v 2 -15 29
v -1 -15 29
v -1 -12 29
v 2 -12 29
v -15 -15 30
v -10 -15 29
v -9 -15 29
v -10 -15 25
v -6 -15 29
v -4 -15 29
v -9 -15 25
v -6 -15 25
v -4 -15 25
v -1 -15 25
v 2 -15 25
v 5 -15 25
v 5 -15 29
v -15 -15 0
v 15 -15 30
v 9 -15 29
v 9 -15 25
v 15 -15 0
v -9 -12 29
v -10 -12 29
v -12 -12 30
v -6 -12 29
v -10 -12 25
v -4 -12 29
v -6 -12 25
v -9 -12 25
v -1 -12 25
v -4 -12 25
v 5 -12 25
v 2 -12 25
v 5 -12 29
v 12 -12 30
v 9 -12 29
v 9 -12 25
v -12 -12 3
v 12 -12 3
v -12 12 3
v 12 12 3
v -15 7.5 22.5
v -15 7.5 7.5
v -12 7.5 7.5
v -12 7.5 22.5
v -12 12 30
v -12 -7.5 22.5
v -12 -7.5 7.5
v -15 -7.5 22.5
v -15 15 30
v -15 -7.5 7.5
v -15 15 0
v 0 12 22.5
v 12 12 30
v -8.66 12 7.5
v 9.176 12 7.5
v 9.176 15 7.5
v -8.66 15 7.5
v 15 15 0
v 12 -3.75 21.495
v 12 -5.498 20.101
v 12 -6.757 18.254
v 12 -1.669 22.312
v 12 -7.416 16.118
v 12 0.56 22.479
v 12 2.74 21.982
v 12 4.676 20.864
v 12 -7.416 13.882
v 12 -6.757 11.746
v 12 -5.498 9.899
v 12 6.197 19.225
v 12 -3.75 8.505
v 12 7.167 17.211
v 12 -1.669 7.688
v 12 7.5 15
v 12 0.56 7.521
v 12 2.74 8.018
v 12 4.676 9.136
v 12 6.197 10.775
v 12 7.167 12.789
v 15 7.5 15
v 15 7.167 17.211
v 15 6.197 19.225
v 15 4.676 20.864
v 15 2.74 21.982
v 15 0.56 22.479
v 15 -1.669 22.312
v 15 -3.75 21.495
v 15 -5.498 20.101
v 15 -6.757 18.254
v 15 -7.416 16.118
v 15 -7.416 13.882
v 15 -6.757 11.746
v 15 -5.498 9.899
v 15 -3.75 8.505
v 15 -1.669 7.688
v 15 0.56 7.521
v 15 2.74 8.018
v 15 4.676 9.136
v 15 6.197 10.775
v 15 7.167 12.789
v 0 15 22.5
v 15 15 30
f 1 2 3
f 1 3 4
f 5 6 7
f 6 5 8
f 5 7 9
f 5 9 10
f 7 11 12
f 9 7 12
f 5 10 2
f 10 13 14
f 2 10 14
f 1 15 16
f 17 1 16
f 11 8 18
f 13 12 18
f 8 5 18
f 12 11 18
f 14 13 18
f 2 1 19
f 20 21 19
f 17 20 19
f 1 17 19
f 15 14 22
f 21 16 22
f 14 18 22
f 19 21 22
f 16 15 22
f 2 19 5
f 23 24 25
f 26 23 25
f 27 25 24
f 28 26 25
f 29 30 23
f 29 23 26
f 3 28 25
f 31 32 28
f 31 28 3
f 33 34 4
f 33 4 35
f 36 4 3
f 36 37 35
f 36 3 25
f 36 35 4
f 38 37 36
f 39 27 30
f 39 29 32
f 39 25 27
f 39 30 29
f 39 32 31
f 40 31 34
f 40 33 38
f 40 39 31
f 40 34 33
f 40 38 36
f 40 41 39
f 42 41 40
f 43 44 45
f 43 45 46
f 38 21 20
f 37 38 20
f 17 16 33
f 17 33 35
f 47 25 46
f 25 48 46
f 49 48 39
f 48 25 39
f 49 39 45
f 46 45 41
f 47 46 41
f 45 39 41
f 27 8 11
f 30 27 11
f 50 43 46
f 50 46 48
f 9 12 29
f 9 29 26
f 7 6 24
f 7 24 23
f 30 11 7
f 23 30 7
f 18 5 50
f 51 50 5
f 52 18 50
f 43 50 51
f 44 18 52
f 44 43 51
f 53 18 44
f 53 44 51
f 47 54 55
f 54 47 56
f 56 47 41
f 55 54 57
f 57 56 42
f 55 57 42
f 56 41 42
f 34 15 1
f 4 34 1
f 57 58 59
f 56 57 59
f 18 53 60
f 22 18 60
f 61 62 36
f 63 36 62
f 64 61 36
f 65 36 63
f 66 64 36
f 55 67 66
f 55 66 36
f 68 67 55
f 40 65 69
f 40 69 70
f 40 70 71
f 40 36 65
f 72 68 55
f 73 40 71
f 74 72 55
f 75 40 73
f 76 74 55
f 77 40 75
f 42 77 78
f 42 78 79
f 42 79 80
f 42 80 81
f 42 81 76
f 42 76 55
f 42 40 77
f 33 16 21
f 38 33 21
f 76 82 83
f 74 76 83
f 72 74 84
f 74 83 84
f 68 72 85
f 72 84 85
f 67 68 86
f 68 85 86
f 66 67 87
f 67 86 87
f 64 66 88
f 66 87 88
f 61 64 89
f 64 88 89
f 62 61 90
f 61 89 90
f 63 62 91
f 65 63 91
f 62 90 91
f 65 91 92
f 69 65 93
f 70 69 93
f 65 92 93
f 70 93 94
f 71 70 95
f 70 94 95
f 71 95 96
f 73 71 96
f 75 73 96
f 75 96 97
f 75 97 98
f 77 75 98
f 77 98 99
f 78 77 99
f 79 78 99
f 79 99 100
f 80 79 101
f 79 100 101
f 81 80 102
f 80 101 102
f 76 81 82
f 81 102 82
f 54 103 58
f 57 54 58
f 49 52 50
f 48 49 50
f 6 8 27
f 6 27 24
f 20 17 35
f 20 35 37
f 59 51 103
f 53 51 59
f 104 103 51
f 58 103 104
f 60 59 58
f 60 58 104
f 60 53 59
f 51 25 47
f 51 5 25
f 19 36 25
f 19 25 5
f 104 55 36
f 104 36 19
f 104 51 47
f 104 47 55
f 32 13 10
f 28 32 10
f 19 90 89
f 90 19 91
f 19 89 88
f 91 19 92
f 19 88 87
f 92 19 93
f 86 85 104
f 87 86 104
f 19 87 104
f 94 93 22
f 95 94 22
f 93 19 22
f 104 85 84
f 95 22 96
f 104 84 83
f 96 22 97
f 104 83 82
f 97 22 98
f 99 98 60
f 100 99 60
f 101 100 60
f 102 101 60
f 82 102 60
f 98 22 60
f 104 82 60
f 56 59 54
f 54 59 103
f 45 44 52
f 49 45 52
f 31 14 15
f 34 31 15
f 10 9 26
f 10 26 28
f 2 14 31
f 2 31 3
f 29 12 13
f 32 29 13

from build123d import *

# Parameters (mm, degrees)
F0_W      = 30
F0_H      = 30
F1_DEPTH  = 30
F2_T      = -3
F3_W      = 15
F3_H      = 15
F4_DEPTH  = 3
F5_R      = 7.5
F6_DEPTH  = 3
F8_DEPTH  = 3
F9_W      = 1
F9_H      = 4
F9_W_2    = 2
F9_W_3    = 3
F9_W_4    = 4
F10_DEPTH = 4


with BuildPart() as f1:
    # F0 (on Top) → F1 (new body)
    with BuildSketch(Plane.XY):
        Rectangle(F0_W, F0_H)
    extrude(amount=F1_DEPTH)

    # F2
    f2_openings = [f1.faces().sort_by_distance(p)[0] for p in [
        (0, 0, 30),
    ]]
    offset(amount=F2_T, openings=f2_openings)

    # F3 (on face) → F4 (cut, through all)
    with BuildSketch(Plane(origin=(-15, 0, 0), x_dir=(0, -1, 0), z_dir=(-1, 0, 0))):
        with Locations((0, 15)):
            Rectangle(F3_W, F3_H)
    extrude(amount=-F4_DEPTH, mode=Mode.SUBTRACT)

    # F5 (on face) → F6 (cut, through all)
    with BuildSketch(Plane.YZ.offset(15)):
        with Locations((0, 15)):
            Circle(F5_R)
    extrude(amount=-F6_DEPTH, mode=Mode.SUBTRACT)

    # F7 (on face) → F8 (cut, through all)
    with BuildSketch(Plane(origin=(0, 15, 0), x_dir=(-1, 0, 0), z_dir=(0, 1, 0))):
        Polygon((8.660254, 7.5), (0, 22.5), (-9.176206, 7.5), align=None)
    extrude(amount=-F8_DEPTH, mode=Mode.SUBTRACT)

    # F9 (on face) → F10 (cut)
    with BuildSketch(Plane.XZ.offset(15)):
        with Locations((-9.5, 27)):
            Rectangle(F9_W, F9_H)
        with Locations((-5, 27)):
            Rectangle(F9_W_2, F9_H)
        with Locations((0.5, 27)):
            Rectangle(F9_W_3, F9_H)
        with Locations((7, 27)):
            Rectangle(F9_W_4, F9_H)
    extrude(amount=-F10_DEPTH, mode=Mode.SUBTRACT)


solid = f1.part
